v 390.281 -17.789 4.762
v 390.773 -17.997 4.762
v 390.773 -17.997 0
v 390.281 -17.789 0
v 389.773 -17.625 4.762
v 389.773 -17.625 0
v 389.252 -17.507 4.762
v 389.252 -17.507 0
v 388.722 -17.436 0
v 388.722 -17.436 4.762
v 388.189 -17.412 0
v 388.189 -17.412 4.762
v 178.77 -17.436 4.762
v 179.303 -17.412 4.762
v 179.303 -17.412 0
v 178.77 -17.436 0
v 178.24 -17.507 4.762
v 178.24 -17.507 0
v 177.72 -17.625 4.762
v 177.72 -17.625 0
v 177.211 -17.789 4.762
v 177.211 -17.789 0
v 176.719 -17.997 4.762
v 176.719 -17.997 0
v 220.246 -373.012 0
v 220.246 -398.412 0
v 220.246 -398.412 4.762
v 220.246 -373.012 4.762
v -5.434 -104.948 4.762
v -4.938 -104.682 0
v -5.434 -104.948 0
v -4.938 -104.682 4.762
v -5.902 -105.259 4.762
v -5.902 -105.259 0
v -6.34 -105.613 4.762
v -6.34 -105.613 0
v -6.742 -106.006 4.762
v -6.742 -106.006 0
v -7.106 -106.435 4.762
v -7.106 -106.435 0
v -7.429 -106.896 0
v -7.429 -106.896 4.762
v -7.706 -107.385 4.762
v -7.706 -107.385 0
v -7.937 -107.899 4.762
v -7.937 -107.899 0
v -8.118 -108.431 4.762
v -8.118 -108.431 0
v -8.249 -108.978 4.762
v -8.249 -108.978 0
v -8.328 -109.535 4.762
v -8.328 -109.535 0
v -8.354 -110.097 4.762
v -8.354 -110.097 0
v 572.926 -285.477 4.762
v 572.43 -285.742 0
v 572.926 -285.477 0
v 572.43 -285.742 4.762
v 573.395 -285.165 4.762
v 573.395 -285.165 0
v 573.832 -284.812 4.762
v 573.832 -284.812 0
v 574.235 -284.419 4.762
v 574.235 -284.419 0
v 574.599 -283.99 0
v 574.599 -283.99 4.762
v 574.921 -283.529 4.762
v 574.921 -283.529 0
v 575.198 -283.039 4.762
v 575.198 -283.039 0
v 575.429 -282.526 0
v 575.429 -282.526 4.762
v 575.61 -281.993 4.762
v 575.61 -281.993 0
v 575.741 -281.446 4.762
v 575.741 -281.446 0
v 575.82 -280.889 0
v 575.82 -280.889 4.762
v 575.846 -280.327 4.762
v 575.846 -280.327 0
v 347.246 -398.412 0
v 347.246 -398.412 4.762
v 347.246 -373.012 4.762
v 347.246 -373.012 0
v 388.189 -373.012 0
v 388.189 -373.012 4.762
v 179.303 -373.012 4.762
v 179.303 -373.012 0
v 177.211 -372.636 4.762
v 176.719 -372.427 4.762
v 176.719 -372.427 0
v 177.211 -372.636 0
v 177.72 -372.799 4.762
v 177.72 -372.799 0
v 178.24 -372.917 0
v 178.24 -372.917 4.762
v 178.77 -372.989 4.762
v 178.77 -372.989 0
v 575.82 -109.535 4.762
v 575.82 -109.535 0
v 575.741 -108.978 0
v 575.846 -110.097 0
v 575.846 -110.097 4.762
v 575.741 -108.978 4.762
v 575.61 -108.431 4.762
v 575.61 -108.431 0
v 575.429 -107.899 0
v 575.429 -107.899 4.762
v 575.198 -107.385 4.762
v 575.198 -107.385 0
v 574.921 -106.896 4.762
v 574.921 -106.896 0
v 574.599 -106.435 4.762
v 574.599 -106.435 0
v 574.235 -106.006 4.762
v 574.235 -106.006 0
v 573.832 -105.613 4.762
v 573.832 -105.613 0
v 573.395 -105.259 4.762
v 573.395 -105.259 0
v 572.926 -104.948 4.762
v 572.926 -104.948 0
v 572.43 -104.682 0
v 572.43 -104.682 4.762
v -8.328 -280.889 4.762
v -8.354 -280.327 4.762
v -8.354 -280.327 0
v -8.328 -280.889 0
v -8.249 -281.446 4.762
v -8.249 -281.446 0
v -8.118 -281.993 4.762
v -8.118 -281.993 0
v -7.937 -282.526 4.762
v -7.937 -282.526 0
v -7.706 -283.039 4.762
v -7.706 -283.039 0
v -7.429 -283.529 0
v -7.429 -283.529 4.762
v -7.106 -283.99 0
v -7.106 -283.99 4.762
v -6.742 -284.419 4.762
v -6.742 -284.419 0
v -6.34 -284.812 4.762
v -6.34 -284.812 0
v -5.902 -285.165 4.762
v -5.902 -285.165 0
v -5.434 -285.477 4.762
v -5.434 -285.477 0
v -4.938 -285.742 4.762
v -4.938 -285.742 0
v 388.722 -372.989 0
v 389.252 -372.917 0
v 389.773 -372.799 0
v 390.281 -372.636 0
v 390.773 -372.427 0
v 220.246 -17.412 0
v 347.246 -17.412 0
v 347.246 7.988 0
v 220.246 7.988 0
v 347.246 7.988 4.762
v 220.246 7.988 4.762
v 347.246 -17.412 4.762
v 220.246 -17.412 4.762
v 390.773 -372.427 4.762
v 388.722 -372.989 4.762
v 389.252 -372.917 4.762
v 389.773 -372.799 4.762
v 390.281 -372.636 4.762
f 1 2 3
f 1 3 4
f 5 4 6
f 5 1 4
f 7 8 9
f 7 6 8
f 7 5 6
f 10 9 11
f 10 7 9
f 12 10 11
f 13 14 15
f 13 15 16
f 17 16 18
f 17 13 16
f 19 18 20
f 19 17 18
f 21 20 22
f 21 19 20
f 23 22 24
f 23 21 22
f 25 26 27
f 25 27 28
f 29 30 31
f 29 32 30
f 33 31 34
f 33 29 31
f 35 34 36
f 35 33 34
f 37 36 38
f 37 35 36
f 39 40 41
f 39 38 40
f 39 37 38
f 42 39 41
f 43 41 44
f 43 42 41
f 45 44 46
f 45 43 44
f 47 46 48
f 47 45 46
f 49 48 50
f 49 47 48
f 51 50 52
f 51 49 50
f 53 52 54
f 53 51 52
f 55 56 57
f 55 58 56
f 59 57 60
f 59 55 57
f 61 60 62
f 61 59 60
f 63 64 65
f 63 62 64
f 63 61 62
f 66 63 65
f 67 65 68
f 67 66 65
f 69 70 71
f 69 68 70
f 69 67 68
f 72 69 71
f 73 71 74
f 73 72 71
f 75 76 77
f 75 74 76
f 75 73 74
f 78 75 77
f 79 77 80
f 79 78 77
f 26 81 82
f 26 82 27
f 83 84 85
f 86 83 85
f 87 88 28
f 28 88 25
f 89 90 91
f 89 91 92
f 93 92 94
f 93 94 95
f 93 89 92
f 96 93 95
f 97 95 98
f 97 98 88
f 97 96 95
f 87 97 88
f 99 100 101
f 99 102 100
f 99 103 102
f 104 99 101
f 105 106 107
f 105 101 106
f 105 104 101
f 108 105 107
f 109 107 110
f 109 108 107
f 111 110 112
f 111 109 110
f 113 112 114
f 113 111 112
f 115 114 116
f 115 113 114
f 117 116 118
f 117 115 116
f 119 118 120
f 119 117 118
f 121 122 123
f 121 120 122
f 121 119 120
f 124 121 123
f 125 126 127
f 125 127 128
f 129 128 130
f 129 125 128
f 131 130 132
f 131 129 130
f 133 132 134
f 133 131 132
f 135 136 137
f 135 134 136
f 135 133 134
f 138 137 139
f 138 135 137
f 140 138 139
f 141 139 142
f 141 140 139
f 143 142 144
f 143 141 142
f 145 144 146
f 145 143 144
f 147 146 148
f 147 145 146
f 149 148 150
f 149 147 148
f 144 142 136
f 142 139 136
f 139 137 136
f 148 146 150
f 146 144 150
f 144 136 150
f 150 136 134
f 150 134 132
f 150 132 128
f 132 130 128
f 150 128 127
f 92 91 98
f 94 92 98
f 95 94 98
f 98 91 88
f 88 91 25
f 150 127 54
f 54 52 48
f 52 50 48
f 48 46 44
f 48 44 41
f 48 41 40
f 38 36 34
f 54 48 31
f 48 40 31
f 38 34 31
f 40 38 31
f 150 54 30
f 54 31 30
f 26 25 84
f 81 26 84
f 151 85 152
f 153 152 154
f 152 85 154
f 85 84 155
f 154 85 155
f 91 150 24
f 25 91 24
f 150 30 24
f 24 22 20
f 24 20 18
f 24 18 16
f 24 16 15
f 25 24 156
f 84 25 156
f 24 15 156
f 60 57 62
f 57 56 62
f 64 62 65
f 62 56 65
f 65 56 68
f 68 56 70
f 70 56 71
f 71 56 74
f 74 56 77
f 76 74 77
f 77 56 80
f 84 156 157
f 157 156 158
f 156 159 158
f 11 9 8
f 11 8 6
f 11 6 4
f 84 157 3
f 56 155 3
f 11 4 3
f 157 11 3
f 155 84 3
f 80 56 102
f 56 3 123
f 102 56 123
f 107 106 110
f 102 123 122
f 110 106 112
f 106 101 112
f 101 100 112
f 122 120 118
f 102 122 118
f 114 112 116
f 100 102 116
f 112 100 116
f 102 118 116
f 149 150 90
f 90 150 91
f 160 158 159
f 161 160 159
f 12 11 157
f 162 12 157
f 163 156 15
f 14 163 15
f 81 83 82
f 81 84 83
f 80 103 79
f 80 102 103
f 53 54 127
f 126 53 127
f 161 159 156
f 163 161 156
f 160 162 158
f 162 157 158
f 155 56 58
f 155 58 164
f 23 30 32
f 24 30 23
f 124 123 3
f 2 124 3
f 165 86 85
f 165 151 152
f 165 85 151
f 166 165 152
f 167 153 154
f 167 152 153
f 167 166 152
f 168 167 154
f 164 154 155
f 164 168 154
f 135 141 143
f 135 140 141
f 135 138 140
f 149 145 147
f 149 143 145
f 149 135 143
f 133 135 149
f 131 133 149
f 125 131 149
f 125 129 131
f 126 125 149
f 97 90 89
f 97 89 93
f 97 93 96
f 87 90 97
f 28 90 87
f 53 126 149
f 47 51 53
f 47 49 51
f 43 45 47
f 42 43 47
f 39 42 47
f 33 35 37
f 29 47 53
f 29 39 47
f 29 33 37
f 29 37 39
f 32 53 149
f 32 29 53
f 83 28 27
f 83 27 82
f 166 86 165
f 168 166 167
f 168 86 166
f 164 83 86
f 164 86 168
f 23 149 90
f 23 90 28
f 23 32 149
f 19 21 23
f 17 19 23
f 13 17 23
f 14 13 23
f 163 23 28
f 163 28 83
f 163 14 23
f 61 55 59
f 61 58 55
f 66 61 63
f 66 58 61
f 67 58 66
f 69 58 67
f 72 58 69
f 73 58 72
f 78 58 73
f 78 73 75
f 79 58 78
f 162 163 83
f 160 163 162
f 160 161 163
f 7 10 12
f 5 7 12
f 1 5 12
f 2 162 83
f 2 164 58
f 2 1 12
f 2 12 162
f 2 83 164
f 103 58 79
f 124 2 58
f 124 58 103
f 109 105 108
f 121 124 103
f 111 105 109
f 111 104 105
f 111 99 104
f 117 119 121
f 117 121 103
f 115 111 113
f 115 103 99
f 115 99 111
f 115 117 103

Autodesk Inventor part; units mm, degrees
ref_plane "YZ Plane" through (0, 0, 0) normal (1, 0, 0) x (0, 1, 0)
ref_plane "XZ Plane" through (0, 0, 0) normal (0, 1, 0) x (-1, 0, 0)
sketch "Sketch1" plane through (0, 0, 0) normal (0, 0, 1) x (1, 0, 0)
  line L0 (42.4461, -373.0123) -> (525.0461, -373.0123)
  line L1 (575.8461, -322.2123) -> (575.8461, -68.2123) construction
  line L2 (525.0461, -17.4123) -> (42.4461, -17.4123)
  line L3 (-8.3539, -68.2123) -> (-8.3539, -322.2123) construction
  arc A0 (575.8461, -68.2123) -> (525.0461, -17.4123) centre (525.0461, -68.2123) ccw
  arc A1 (525.0461, -373.0123) -> (575.8461, -322.2123) centre (525.0461, -322.2123) ccw
  arc A2 (-8.3539, -322.2123) -> (42.4461, -373.0123) centre (42.4461, -322.2123) ccw
  arc A3 (42.4461, -17.4123) -> (-8.3539, -68.2123) centre (42.4461, -68.2123) ccw
  line L4 (-8.3539, -195.2123) -> (575.8461, -195.2123) construction
  line L5 (-8.3539, -106.3123) -> (177.9452, -17.4123)
  line L6 (-8.3539, -106.3123) -> (198.0693, -106.3123) construction
  line L7 (-8.3539, -284.1123) -> (177.9452, -373.0123)
  line L8 (283.7461, -17.4123) -> (283.7461, -373.0123) construction
  line L9 (575.8461, -106.3123) -> (389.5471, -17.4123)
  line L10 (575.8461, -284.1123) -> (389.5471, -373.0123)
  line L11 (575.8461, -106.3123) -> (575.8461, -284.1123)
  line L12 (-8.3539, -106.3123) -> (-8.3539, -284.1123)
  line L13 (177.9452, -17.4123) -> (389.5471, -17.4123)
  line L14 (389.5471, -373.0123) -> (177.9452, -373.0123)
  point P0 (0, 0)
  point P1 (-8.3539, -373.0123)
  point P2 (575.8461, -17.4123)
  point P3 (575.8461, -373.0123)
  point P4 (-8.3539, -17.4123)
  dimension "d0" = 355.6
  dimension "d1" = 584.2
  dimension "d4" = 50.8
  dimension "d25" = 25.51
  dimension "d26" = 254
  dimension "d27" = 88.9
  dimension "d28" = 575.8461
  dimension "d29" = 195.2123
extrude "Extrusion1" add sketch "Sketch1" along normal blind 4.7625
sketch "Sketch2" plane through (0, 0, 0) normal (0, 0, 1) x (1, 0, 0)
  line L0 (283.7461, -373.0123) -> (347.2461, -373.0123)
  line L1 (347.2461, -373.0123) -> (347.2461, -398.4123)
  line L2 (347.2461, -398.4123) -> (283.7461, -398.4123)
  line L3 (220.2461, -373.0123) -> (347.2461, -373.0123)
  line L4 (347.2461, -373.0123) -> (347.2461, -398.4123)
  line L5 (347.2461, -398.4123) -> (220.2461, -398.4123)
  line L6 (220.2461, -398.4123) -> (220.2461, -373.0123)
  line L7 (220.2461, -373.0123) -> (347.2461, -398.4123) construction
  line L8 (347.2461, -373.0123) -> (220.2461, -398.4123) construction
  line L9 (283.7461, -17.4123) -> (347.2461, -17.4123)
  line L10 (347.2461, -17.4123) -> (347.2461, 7.9877)
  line L11 (347.2461, 7.9877) -> (283.7461, 7.9877)
  line L12 (220.2461, -17.4123) -> (347.2461, -17.4123)
  line L13 (347.2461, -17.4123) -> (347.2461, 7.9877)
  line L14 (347.2461, 7.9877) -> (220.2461, 7.9877)
  line L15 (220.2461, 7.9877) -> (220.2461, -17.4123)
  line L16 (220.2461, -17.4123) -> (347.2461, 7.9877) construction
  line L17 (347.2461, -17.4123) -> (220.2461, 7.9877) construction
extrude "Extrusion2" add sketch "Sketch2" along normal up to surface (4.7625 mm away)
fillet "Fillet1" radius 6 8 edges at (-8.3539, -106.3123, 2.3813) (-8.3539, -284.1123, 2.3813) (177.9452, -373.0123, 2.3813) (389.5471, -373.0123, 2.3813) (575.8461, -284.1123, 2.3813) (575.8461, -106.3123, 2.3813) (389.5471, -17.4123, 2.3813) (177.9452, -17.4123, 2.3813)
ref_plane "Work Plane1" through (220.2461, -195.2123, 0) normal (0, -1, 0) x (1, 0, 0)
ref_plane "Work Plane2" through (283.7461, -280.3273, 0) normal (1, 0, 0) x (0, 0, -1)
properties part number "1211_Racetrack Board_V1" material "GFRP"
